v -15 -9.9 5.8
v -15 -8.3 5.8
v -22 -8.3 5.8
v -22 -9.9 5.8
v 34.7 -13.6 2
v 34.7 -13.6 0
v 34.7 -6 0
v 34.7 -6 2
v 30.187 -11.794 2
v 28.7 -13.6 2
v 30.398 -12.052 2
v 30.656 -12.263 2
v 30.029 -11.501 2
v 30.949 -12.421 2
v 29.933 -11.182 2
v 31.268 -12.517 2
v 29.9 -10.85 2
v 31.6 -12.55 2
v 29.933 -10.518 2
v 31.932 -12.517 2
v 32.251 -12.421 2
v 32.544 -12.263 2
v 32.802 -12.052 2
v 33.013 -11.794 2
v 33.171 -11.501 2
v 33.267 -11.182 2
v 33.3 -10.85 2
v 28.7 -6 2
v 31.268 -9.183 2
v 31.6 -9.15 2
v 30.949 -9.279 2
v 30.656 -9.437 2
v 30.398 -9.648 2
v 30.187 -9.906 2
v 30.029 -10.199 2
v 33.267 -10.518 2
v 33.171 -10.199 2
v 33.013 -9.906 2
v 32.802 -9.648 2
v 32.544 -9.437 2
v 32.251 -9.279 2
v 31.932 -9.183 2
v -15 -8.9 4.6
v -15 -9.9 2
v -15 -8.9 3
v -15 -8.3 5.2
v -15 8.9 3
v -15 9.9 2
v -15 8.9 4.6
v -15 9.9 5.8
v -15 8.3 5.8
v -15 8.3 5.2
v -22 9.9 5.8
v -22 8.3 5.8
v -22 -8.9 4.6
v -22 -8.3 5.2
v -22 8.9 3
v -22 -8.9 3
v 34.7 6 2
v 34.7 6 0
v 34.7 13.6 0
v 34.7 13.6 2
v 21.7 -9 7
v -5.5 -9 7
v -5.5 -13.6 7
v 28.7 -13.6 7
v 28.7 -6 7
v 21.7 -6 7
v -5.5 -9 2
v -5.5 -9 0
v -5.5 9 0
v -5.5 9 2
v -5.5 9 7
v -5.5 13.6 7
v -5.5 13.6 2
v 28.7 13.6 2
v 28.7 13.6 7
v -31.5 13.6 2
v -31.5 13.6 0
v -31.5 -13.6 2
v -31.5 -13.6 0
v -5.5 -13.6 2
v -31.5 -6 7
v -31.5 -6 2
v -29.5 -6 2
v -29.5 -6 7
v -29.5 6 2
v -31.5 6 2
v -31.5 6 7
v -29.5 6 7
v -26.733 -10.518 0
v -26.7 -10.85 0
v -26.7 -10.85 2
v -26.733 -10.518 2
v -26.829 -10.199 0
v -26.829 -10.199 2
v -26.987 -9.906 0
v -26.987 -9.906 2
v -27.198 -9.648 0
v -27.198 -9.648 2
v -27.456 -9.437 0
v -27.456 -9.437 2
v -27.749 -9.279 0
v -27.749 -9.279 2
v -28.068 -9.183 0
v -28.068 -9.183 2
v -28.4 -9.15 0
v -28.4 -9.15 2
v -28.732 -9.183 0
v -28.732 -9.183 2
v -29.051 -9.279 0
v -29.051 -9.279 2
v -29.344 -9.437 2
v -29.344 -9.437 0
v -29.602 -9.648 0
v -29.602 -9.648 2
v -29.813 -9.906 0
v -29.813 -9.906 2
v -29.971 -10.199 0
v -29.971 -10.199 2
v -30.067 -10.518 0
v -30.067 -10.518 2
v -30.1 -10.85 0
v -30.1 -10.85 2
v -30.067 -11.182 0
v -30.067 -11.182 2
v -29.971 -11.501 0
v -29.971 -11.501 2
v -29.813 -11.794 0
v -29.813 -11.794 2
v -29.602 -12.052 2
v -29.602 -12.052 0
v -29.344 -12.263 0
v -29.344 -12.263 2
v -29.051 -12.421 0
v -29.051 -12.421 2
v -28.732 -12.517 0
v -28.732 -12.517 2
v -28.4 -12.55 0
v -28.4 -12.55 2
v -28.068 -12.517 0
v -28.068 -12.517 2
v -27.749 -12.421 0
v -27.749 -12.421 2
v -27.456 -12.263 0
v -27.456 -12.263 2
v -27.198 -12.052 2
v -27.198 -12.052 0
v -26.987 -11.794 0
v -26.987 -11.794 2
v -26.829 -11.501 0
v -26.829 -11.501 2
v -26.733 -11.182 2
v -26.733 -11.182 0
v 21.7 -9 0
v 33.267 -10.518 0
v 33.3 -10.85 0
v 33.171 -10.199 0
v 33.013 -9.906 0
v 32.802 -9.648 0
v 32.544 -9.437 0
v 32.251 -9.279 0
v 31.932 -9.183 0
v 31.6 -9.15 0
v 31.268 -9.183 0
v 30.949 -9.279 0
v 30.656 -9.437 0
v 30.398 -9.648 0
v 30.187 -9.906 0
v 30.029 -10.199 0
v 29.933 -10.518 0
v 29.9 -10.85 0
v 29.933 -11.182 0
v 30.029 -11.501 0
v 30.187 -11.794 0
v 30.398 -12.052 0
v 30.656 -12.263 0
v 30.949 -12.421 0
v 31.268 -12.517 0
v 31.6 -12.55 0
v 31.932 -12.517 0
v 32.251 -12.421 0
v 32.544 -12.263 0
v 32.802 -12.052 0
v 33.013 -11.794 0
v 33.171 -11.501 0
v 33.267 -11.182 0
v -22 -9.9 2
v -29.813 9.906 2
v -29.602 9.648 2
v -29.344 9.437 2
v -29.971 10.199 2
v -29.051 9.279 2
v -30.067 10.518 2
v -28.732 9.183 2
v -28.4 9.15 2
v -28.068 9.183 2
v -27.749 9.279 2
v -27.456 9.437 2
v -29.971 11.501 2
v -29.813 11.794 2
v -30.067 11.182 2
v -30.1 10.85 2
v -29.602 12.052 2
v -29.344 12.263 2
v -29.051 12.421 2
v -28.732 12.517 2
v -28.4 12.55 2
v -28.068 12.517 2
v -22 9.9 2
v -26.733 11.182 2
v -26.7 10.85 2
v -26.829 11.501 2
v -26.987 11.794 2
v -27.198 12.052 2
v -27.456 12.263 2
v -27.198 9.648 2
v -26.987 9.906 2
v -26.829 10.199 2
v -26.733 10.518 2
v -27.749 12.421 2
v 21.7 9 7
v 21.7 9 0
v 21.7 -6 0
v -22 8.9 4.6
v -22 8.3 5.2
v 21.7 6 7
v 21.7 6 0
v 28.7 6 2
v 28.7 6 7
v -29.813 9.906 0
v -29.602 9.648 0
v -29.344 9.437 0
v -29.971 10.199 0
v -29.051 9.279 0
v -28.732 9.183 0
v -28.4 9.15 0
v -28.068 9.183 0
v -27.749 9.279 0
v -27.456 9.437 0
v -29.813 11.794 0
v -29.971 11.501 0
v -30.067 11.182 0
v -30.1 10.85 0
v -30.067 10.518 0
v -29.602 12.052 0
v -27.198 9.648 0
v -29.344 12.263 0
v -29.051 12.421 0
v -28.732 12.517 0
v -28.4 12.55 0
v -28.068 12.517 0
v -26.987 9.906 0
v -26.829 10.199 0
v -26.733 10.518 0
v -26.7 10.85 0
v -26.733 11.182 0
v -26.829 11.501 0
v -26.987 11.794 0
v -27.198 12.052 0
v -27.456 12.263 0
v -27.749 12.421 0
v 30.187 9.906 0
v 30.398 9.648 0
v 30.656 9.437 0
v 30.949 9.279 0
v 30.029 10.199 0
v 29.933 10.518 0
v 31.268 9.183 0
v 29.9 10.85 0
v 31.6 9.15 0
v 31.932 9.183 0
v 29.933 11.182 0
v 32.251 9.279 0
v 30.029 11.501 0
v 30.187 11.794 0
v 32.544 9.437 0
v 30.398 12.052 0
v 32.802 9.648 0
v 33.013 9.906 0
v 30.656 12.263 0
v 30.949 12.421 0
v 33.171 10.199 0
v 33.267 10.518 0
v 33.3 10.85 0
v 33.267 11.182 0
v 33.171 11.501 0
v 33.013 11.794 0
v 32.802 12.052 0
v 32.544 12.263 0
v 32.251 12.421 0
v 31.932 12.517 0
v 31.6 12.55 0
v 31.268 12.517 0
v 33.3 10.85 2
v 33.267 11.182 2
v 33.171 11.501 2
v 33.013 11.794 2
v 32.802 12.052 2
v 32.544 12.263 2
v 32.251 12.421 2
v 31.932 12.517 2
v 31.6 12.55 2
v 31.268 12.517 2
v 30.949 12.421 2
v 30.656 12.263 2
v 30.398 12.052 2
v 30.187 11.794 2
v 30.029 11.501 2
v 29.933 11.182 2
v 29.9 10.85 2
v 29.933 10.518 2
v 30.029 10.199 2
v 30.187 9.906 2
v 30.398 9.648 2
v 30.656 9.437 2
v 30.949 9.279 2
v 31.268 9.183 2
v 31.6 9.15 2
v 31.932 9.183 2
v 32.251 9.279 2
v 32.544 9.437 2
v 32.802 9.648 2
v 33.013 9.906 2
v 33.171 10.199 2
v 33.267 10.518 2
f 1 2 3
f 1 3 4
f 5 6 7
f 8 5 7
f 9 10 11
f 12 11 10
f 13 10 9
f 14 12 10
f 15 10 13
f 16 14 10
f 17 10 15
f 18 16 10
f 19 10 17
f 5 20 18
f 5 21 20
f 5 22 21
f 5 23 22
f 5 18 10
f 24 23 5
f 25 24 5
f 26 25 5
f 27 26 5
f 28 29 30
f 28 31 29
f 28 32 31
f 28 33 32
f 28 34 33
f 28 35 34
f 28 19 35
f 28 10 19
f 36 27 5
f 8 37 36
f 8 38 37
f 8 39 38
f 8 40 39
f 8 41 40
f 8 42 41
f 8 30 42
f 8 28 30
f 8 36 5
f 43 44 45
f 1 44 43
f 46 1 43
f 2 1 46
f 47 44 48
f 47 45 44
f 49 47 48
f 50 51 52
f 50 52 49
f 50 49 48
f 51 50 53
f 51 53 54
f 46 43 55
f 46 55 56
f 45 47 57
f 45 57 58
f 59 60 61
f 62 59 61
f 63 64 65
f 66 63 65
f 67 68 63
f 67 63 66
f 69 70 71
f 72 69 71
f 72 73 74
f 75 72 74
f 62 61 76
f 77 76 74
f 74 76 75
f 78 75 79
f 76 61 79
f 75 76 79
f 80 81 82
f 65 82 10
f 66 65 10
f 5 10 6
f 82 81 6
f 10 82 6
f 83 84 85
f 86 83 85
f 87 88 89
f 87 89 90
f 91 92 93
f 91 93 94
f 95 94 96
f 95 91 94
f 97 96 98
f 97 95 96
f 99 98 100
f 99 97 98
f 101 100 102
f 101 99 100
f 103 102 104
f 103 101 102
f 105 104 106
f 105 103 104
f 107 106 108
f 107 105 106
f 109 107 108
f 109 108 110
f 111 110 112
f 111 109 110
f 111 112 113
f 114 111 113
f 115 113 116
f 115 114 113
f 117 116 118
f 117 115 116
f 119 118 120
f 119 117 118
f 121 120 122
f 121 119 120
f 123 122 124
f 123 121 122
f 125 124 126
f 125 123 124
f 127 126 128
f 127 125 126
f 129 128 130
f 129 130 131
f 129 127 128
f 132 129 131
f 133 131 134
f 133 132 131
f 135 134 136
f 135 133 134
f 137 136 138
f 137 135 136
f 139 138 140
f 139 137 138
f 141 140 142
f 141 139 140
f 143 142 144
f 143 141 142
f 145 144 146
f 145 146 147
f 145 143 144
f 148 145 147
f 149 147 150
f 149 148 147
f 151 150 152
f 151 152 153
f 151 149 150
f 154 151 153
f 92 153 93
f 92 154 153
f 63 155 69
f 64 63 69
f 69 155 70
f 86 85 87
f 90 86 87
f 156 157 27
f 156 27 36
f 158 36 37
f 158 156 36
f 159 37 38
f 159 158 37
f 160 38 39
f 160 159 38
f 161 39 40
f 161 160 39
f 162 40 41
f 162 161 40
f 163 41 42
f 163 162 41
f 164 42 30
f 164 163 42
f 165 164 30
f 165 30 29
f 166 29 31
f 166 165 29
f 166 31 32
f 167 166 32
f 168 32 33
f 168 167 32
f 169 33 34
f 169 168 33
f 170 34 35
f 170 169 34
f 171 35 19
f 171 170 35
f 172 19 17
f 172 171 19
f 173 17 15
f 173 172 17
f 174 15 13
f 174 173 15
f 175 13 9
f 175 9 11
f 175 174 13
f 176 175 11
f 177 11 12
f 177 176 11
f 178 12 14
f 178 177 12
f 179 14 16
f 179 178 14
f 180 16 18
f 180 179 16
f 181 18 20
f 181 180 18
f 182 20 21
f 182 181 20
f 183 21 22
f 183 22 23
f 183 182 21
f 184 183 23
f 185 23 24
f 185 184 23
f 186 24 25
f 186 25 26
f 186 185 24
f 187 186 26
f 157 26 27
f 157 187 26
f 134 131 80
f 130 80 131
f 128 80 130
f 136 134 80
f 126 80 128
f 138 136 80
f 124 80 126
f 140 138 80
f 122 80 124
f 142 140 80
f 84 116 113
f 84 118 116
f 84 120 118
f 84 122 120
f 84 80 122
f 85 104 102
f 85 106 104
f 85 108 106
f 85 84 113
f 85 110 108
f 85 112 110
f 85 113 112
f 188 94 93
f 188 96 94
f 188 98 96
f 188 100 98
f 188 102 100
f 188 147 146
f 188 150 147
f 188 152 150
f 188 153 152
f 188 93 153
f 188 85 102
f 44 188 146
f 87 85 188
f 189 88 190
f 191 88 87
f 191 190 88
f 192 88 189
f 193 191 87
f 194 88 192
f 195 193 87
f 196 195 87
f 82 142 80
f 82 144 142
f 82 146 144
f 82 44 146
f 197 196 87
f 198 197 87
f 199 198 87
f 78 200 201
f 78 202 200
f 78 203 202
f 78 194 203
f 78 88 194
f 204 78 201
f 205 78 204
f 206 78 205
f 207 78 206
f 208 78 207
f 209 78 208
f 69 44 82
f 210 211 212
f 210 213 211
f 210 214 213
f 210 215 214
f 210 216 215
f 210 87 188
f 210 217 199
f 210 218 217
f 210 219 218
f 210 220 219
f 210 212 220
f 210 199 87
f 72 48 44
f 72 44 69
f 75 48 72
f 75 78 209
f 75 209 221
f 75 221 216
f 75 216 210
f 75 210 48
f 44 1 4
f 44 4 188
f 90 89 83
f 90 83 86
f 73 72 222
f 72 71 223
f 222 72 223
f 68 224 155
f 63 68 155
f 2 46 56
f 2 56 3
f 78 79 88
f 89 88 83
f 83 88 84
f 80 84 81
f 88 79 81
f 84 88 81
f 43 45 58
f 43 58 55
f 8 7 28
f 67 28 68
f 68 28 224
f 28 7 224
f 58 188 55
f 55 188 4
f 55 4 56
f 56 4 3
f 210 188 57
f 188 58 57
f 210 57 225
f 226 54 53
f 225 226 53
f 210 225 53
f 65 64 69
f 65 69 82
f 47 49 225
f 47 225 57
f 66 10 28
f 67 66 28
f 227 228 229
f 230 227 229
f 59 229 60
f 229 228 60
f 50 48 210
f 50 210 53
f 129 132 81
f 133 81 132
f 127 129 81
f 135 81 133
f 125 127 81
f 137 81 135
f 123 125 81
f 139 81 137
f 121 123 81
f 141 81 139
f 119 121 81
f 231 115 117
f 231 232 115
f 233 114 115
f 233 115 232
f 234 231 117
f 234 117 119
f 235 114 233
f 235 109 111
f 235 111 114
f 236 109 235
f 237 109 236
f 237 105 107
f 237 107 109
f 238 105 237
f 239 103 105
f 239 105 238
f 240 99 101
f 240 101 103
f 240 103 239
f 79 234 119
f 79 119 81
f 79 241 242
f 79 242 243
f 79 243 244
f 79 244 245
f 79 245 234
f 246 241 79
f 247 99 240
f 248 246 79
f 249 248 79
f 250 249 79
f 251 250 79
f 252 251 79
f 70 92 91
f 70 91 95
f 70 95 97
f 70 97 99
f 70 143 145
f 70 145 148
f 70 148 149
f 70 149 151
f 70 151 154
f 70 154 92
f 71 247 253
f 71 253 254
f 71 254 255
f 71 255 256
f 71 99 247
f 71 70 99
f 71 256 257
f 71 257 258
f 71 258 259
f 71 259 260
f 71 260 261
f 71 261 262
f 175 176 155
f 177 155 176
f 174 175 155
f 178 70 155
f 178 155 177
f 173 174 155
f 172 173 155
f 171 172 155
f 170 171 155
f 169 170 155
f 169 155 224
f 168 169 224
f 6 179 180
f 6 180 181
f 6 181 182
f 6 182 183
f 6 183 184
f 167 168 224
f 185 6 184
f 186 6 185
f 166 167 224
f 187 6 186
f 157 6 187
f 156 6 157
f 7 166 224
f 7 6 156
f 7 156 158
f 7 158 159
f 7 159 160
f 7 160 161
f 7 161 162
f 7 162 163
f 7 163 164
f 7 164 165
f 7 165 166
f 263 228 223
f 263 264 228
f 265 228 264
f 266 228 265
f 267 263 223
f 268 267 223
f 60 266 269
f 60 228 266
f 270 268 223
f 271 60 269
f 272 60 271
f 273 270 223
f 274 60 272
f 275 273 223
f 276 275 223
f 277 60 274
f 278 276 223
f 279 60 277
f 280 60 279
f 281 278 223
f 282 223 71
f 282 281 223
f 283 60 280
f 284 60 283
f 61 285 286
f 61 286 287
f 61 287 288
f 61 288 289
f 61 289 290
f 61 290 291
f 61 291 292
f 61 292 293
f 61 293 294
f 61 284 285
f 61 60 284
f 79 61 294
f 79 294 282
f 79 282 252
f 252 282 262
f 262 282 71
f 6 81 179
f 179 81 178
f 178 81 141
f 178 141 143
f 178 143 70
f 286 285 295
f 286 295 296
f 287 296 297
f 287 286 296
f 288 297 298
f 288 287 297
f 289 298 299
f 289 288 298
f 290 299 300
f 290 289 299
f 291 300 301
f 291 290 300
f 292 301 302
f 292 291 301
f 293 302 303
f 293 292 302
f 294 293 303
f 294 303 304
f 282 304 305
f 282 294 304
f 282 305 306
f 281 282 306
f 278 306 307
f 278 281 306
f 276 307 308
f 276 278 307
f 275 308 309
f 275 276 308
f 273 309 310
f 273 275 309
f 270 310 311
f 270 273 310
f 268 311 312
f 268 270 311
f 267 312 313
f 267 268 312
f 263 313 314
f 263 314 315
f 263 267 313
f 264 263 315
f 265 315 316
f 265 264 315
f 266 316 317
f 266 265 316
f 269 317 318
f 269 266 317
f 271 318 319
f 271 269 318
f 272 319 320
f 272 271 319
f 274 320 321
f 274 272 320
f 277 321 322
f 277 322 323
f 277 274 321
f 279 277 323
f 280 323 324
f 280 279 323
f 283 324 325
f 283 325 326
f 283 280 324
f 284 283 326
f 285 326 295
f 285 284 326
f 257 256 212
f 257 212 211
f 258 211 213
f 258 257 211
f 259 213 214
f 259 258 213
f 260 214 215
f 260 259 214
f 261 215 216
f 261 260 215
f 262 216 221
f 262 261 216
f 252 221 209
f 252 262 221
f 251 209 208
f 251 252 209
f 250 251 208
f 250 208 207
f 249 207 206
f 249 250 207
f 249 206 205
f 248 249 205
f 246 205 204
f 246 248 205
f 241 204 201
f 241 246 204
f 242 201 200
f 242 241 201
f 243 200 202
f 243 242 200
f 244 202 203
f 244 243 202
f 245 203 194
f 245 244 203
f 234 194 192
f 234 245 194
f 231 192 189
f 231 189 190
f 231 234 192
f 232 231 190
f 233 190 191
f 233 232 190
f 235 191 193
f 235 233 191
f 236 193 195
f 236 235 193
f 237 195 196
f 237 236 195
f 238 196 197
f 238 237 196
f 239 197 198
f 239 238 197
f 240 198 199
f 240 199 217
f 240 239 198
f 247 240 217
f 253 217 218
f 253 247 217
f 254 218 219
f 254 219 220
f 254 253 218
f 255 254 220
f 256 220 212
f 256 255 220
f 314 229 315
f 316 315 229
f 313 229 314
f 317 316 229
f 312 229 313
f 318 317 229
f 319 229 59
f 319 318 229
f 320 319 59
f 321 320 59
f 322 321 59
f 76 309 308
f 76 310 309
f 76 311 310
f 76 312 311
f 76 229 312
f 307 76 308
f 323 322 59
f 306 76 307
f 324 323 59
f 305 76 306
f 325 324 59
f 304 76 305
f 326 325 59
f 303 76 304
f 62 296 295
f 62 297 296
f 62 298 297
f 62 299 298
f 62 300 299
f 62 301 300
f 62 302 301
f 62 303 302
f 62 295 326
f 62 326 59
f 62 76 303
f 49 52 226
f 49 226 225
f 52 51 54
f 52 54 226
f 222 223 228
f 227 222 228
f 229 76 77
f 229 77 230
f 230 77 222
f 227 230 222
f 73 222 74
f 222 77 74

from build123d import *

# Parameters (mm, degrees)
SKETCH022_R  = 1.7
PAD005_DEPTH = 2
PAD006_DEPTH = 7
PAD007_DEPTH = 7
SKETCH025_W  = 2
SKETCH025_H  = 12
PAD008_DEPTH = 5


with BuildPart() as part:
    # Sketch022 → Pad005 (new body)
    with BuildSketch(Plane.XY):
        Polygon((-31.5, -13.6), (34.7, -13.6), (34.7, -6), (21.7, -6), (21.7, -9), (-5.5, -9), (-5.5, 9), (21.7, 9), (21.7, 6), (34.7, 6), (34.7, 13.6), (-31.5, 13.6), align=None)
        with Locations((31.6, 10.85)):
            Circle(SKETCH022_R, mode=Mode.SUBTRACT)
        with Locations((31.6, -10.85)):
            Circle(SKETCH022_R, mode=Mode.SUBTRACT)
        with Locations((-28.4, 10.85)):
            Circle(SKETCH022_R, mode=Mode.SUBTRACT)
        with Locations((-28.4, -10.85)):
            Circle(SKETCH022_R, mode=Mode.SUBTRACT)
    extrude(amount=PAD005_DEPTH)

    # Sketch023 → Pad006 (join)
    with BuildSketch(Plane.XY):
        Polygon((-5.5, 9), (-5.5, 13.6), (28.7, 13.6), (28.7, 6), (21.7, 6), (21.7, 9), align=None)
        Polygon((-5.5, -9), (-5.5, -13.6), (28.7, -13.6), (28.7, -6), (21.7, -6), (21.7, -9), align=None)
    extrude(amount=PAD006_DEPTH)

    # Sketch024 → Pad007 (join)
    with BuildSketch(Plane.YZ.offset(-15)):
        Polygon((9.9, 0), (9.9, 5.8), (8.3, 5.8), (8.3, 5.2), (8.9, 4.6), (8.9, 3), (-8.9, 3), (-8.9, 4.6), (-8.3, 5.2), (-8.3, 5.8), (-9.9, 5.8), (-9.9, 0), align=None)
    extrude(amount=-PAD007_DEPTH)

    # Sketch025 (on Face4 of Pad007) → Pad008 (join)
    with BuildSketch(Plane.XY.offset(2)):
        with Locations((-30.5, 0)):
            Rectangle(SKETCH025_W, SKETCH025_H)
    extrude(amount=PAD008_DEPTH)


solid = part.part
